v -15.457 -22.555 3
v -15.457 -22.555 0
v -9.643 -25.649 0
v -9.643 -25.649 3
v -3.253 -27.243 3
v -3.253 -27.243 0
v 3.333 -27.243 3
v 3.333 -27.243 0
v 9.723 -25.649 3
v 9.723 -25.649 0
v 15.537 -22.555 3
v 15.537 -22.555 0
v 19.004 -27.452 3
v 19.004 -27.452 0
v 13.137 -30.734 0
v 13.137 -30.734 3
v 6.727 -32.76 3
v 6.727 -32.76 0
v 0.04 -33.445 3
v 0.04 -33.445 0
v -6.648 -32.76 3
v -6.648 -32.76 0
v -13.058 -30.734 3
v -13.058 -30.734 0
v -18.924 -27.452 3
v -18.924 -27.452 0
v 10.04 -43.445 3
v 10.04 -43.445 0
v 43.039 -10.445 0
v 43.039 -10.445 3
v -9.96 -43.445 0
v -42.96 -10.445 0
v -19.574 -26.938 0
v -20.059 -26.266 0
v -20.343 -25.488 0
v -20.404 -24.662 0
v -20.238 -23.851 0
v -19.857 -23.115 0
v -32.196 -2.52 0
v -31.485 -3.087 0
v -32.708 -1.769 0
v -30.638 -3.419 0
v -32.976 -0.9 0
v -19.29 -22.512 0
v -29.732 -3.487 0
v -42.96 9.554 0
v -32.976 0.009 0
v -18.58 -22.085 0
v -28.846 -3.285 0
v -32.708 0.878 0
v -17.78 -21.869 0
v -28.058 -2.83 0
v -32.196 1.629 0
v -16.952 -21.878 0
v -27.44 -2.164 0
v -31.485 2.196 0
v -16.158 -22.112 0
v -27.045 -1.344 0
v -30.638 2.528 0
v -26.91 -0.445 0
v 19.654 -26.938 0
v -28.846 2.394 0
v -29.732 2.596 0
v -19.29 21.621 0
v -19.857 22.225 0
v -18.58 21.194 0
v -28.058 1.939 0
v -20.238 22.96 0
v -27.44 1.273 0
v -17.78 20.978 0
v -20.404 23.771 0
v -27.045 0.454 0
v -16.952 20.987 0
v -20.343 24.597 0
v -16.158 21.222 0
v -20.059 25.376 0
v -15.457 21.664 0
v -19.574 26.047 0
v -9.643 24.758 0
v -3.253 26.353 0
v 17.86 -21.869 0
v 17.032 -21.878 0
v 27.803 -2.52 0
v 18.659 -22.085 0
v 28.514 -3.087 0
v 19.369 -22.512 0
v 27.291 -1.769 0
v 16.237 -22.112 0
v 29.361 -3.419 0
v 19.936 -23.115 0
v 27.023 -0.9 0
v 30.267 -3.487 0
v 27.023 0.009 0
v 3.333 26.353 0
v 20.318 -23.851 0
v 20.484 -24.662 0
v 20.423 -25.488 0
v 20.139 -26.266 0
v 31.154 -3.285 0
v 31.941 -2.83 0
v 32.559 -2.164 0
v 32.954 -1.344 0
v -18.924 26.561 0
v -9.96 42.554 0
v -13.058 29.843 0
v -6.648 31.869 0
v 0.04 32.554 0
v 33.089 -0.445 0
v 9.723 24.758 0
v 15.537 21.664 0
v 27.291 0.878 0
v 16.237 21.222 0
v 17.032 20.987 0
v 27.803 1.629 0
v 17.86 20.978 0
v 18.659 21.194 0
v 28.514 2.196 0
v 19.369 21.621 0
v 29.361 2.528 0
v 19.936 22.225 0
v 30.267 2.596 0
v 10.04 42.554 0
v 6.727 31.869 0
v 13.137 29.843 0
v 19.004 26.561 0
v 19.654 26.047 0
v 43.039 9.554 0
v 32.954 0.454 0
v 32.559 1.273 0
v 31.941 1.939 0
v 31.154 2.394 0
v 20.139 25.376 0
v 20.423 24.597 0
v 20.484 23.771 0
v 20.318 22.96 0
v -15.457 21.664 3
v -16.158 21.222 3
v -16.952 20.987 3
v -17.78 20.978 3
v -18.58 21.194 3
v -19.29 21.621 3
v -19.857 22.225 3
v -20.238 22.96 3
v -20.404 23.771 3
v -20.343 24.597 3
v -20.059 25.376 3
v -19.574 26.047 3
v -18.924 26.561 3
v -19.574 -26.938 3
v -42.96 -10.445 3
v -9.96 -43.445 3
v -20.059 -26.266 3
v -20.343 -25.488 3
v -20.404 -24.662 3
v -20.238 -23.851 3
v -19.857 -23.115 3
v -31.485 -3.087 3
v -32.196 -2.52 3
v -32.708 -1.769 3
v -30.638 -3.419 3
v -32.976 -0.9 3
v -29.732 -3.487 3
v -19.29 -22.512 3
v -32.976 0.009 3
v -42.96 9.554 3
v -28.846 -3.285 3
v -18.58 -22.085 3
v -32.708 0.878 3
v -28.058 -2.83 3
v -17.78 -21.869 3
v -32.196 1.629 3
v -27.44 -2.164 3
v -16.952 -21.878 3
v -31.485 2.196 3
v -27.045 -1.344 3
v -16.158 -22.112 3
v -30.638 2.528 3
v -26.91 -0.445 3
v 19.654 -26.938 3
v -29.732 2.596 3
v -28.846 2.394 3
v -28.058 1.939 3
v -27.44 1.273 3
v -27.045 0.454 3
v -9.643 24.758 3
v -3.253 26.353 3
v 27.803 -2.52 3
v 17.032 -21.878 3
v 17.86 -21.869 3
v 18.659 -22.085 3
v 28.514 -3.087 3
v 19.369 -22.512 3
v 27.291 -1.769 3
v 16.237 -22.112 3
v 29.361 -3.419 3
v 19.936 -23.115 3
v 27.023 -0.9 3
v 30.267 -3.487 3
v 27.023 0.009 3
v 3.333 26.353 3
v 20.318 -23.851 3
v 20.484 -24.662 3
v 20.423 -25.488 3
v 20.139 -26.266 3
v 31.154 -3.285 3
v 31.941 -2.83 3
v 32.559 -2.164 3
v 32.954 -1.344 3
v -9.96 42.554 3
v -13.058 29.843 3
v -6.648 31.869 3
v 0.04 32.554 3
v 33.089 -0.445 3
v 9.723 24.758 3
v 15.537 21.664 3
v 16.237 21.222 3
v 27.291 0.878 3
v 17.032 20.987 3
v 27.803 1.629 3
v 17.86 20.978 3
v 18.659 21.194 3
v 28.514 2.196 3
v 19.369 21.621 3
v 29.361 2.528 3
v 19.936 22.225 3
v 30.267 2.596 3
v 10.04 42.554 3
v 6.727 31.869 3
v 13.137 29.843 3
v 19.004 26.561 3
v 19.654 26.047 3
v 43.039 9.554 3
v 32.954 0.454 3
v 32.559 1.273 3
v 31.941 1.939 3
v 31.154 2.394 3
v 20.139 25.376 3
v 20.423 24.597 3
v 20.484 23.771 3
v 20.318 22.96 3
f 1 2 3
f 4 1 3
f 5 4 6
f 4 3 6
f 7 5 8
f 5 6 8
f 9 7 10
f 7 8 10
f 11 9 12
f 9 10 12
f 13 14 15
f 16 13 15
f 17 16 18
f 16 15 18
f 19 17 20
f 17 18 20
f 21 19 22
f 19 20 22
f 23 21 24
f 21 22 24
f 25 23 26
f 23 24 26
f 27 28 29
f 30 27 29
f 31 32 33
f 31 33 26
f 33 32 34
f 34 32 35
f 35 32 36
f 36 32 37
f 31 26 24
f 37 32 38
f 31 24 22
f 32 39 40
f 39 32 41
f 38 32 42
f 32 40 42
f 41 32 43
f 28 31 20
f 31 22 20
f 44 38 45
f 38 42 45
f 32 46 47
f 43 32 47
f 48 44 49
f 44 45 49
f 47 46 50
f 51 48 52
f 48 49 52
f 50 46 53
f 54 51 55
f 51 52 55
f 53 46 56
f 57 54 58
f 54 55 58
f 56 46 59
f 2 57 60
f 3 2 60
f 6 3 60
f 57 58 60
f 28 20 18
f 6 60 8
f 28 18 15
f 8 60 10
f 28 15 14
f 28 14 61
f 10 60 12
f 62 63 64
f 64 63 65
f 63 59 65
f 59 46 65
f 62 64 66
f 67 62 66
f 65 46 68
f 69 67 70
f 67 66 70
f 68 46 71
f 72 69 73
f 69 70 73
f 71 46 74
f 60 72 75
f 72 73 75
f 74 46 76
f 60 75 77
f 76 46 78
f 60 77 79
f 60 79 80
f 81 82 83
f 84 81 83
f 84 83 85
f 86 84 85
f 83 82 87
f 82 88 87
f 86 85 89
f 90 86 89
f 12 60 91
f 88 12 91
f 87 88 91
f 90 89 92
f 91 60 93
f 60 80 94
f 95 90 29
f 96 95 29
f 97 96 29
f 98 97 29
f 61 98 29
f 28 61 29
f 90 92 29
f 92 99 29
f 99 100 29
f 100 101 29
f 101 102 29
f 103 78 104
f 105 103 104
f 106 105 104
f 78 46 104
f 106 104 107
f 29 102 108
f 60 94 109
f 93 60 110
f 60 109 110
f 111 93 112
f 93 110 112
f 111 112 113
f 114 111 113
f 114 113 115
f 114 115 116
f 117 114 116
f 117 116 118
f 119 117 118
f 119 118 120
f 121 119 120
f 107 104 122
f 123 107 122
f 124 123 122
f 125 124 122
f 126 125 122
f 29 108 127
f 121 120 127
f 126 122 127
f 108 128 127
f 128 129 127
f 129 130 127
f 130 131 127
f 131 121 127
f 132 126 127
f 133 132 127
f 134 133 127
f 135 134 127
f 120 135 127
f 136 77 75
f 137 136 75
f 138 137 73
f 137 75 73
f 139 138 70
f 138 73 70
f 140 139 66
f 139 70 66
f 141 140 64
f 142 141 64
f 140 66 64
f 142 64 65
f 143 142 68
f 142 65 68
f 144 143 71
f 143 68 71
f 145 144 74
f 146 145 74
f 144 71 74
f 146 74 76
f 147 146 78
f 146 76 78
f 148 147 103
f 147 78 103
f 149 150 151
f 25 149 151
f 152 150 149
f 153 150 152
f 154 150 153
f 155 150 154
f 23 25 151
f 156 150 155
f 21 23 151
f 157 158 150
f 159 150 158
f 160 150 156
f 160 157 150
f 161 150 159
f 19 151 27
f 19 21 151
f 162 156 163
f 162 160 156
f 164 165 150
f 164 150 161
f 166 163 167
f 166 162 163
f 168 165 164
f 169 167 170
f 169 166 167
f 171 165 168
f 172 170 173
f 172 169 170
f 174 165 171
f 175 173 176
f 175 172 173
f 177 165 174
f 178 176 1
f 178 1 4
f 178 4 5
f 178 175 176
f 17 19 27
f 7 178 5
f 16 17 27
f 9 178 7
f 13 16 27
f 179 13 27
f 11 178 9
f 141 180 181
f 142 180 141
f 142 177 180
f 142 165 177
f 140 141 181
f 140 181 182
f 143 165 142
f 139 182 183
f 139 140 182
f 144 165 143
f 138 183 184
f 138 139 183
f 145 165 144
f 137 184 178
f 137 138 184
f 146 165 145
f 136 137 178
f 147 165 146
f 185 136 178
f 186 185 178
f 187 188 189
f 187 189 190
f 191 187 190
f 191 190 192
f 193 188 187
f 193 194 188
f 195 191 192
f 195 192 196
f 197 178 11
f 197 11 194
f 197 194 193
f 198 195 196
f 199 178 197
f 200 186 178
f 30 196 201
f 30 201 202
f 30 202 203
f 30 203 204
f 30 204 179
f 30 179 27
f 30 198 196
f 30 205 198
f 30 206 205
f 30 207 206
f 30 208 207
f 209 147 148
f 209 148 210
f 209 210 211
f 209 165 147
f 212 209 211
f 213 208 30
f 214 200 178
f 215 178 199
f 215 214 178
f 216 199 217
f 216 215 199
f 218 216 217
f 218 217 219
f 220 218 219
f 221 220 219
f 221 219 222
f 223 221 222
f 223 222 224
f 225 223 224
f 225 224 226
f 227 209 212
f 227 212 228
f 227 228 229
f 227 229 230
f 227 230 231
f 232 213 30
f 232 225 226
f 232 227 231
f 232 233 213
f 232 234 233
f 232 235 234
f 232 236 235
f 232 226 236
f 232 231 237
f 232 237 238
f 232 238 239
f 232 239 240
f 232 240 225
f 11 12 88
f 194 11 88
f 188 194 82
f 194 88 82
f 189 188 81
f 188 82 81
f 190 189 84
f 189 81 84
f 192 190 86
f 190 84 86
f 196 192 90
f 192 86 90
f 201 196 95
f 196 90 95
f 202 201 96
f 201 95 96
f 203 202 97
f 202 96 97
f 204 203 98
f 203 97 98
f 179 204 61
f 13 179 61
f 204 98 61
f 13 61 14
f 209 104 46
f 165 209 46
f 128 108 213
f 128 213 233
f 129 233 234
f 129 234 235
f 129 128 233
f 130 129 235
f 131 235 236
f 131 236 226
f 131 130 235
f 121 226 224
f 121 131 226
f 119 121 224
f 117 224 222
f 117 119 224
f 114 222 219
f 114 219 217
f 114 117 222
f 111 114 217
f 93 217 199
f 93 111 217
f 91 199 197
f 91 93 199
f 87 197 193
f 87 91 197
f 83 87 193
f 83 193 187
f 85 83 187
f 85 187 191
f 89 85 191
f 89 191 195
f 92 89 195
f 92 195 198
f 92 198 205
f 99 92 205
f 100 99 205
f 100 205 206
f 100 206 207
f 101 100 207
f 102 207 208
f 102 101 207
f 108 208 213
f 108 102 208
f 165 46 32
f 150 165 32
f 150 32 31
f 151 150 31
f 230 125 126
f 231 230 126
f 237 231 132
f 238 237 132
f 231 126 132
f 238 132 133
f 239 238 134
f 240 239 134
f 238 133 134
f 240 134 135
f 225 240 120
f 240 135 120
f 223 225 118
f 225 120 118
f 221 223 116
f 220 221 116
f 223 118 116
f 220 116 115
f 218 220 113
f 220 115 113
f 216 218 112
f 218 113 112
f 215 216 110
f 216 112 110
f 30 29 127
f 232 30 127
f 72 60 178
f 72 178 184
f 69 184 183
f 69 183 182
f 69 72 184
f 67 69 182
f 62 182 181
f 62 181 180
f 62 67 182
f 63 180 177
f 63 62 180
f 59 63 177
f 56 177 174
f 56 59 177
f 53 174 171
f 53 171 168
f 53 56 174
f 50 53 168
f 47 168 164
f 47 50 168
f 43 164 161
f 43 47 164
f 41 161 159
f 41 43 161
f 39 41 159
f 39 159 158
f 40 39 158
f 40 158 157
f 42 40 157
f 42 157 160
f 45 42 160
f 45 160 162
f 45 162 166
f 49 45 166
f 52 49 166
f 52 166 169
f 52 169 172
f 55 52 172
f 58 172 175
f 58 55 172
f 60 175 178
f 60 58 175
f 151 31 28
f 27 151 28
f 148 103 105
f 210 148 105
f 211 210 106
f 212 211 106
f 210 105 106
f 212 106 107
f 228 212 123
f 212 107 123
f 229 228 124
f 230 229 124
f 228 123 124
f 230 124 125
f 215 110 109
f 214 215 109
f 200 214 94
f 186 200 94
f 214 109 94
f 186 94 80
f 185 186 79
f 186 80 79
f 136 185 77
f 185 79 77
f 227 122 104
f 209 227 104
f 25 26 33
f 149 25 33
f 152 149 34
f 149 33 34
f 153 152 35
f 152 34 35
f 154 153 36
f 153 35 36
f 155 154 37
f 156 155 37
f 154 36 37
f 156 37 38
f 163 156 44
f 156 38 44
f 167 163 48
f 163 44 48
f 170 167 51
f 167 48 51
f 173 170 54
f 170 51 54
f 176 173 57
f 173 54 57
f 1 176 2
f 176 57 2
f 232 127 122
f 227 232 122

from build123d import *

# Parameters (mm, degrees)
SKETCH_1_R      = 3.0499512
EXTRUDE_1_DEPTH = 3


with BuildPart() as part:
    # 草图1 → 凸台-拉伸1 (new body)
    with BuildSketch(Plane.XY):
        Polygon((43.039042287, -10.445300798), (43.039042287, 9.554379202), (10.039570287, 42.553851202), (-9.960109713, 42.553851202), (-42.959581713, 9.554379202), (-42.959581713, -10.445300798), (-9.960109713, -43.444772798), (10.039570287, -43.444772798), align=None)
        with Locations((30.039250287, -0.445460798)):
            Circle(SKETCH_1_R, mode=Mode.SUBTRACT)
        with Locations((-29.959789713, -0.445460798)):
            Circle(SKETCH_1_R, mode=Mode.SUBTRACT)
        with BuildLine():
            ThreePointArc((15.536857472, 21.66371651), (0.039730287, 26.554107202), (-15.457396897, 21.66371651))
            ThreePointArc((-15.457396897, 21.66371651), (-19.856993747, 22.224541332), (-18.924411805, 26.56058421))
            ThreePointArc((-18.924411805, 26.56058421), (0.039730287, 32.554011202), (19.00387238, 26.56058421))
            ThreePointArc((19.00387238, 26.56058421), (19.936454322, 22.224541332), (15.536857472, 21.66371651))
        make_face(mode=Mode.SUBTRACT)
        with BuildLine():
            ThreePointArc((-15.457396897, -22.554638105), (0.039730287, -27.445028798), (15.536857472, -22.554638105))
            ThreePointArc((15.536857472, -22.554638105), (19.936454322, -23.115462927), (19.00387238, -27.451505806))
            ThreePointArc((19.00387238, -27.451505806), (0.039730287, -33.444932798), (-18.924411805, -27.451505806))
            ThreePointArc((-18.924411805, -27.451505806), (-19.856993747, -23.115462927), (-15.457396897, -22.554638105))
        make_face(mode=Mode.SUBTRACT)
    extrude(amount=EXTRUDE_1_DEPTH)


solid = part.part
